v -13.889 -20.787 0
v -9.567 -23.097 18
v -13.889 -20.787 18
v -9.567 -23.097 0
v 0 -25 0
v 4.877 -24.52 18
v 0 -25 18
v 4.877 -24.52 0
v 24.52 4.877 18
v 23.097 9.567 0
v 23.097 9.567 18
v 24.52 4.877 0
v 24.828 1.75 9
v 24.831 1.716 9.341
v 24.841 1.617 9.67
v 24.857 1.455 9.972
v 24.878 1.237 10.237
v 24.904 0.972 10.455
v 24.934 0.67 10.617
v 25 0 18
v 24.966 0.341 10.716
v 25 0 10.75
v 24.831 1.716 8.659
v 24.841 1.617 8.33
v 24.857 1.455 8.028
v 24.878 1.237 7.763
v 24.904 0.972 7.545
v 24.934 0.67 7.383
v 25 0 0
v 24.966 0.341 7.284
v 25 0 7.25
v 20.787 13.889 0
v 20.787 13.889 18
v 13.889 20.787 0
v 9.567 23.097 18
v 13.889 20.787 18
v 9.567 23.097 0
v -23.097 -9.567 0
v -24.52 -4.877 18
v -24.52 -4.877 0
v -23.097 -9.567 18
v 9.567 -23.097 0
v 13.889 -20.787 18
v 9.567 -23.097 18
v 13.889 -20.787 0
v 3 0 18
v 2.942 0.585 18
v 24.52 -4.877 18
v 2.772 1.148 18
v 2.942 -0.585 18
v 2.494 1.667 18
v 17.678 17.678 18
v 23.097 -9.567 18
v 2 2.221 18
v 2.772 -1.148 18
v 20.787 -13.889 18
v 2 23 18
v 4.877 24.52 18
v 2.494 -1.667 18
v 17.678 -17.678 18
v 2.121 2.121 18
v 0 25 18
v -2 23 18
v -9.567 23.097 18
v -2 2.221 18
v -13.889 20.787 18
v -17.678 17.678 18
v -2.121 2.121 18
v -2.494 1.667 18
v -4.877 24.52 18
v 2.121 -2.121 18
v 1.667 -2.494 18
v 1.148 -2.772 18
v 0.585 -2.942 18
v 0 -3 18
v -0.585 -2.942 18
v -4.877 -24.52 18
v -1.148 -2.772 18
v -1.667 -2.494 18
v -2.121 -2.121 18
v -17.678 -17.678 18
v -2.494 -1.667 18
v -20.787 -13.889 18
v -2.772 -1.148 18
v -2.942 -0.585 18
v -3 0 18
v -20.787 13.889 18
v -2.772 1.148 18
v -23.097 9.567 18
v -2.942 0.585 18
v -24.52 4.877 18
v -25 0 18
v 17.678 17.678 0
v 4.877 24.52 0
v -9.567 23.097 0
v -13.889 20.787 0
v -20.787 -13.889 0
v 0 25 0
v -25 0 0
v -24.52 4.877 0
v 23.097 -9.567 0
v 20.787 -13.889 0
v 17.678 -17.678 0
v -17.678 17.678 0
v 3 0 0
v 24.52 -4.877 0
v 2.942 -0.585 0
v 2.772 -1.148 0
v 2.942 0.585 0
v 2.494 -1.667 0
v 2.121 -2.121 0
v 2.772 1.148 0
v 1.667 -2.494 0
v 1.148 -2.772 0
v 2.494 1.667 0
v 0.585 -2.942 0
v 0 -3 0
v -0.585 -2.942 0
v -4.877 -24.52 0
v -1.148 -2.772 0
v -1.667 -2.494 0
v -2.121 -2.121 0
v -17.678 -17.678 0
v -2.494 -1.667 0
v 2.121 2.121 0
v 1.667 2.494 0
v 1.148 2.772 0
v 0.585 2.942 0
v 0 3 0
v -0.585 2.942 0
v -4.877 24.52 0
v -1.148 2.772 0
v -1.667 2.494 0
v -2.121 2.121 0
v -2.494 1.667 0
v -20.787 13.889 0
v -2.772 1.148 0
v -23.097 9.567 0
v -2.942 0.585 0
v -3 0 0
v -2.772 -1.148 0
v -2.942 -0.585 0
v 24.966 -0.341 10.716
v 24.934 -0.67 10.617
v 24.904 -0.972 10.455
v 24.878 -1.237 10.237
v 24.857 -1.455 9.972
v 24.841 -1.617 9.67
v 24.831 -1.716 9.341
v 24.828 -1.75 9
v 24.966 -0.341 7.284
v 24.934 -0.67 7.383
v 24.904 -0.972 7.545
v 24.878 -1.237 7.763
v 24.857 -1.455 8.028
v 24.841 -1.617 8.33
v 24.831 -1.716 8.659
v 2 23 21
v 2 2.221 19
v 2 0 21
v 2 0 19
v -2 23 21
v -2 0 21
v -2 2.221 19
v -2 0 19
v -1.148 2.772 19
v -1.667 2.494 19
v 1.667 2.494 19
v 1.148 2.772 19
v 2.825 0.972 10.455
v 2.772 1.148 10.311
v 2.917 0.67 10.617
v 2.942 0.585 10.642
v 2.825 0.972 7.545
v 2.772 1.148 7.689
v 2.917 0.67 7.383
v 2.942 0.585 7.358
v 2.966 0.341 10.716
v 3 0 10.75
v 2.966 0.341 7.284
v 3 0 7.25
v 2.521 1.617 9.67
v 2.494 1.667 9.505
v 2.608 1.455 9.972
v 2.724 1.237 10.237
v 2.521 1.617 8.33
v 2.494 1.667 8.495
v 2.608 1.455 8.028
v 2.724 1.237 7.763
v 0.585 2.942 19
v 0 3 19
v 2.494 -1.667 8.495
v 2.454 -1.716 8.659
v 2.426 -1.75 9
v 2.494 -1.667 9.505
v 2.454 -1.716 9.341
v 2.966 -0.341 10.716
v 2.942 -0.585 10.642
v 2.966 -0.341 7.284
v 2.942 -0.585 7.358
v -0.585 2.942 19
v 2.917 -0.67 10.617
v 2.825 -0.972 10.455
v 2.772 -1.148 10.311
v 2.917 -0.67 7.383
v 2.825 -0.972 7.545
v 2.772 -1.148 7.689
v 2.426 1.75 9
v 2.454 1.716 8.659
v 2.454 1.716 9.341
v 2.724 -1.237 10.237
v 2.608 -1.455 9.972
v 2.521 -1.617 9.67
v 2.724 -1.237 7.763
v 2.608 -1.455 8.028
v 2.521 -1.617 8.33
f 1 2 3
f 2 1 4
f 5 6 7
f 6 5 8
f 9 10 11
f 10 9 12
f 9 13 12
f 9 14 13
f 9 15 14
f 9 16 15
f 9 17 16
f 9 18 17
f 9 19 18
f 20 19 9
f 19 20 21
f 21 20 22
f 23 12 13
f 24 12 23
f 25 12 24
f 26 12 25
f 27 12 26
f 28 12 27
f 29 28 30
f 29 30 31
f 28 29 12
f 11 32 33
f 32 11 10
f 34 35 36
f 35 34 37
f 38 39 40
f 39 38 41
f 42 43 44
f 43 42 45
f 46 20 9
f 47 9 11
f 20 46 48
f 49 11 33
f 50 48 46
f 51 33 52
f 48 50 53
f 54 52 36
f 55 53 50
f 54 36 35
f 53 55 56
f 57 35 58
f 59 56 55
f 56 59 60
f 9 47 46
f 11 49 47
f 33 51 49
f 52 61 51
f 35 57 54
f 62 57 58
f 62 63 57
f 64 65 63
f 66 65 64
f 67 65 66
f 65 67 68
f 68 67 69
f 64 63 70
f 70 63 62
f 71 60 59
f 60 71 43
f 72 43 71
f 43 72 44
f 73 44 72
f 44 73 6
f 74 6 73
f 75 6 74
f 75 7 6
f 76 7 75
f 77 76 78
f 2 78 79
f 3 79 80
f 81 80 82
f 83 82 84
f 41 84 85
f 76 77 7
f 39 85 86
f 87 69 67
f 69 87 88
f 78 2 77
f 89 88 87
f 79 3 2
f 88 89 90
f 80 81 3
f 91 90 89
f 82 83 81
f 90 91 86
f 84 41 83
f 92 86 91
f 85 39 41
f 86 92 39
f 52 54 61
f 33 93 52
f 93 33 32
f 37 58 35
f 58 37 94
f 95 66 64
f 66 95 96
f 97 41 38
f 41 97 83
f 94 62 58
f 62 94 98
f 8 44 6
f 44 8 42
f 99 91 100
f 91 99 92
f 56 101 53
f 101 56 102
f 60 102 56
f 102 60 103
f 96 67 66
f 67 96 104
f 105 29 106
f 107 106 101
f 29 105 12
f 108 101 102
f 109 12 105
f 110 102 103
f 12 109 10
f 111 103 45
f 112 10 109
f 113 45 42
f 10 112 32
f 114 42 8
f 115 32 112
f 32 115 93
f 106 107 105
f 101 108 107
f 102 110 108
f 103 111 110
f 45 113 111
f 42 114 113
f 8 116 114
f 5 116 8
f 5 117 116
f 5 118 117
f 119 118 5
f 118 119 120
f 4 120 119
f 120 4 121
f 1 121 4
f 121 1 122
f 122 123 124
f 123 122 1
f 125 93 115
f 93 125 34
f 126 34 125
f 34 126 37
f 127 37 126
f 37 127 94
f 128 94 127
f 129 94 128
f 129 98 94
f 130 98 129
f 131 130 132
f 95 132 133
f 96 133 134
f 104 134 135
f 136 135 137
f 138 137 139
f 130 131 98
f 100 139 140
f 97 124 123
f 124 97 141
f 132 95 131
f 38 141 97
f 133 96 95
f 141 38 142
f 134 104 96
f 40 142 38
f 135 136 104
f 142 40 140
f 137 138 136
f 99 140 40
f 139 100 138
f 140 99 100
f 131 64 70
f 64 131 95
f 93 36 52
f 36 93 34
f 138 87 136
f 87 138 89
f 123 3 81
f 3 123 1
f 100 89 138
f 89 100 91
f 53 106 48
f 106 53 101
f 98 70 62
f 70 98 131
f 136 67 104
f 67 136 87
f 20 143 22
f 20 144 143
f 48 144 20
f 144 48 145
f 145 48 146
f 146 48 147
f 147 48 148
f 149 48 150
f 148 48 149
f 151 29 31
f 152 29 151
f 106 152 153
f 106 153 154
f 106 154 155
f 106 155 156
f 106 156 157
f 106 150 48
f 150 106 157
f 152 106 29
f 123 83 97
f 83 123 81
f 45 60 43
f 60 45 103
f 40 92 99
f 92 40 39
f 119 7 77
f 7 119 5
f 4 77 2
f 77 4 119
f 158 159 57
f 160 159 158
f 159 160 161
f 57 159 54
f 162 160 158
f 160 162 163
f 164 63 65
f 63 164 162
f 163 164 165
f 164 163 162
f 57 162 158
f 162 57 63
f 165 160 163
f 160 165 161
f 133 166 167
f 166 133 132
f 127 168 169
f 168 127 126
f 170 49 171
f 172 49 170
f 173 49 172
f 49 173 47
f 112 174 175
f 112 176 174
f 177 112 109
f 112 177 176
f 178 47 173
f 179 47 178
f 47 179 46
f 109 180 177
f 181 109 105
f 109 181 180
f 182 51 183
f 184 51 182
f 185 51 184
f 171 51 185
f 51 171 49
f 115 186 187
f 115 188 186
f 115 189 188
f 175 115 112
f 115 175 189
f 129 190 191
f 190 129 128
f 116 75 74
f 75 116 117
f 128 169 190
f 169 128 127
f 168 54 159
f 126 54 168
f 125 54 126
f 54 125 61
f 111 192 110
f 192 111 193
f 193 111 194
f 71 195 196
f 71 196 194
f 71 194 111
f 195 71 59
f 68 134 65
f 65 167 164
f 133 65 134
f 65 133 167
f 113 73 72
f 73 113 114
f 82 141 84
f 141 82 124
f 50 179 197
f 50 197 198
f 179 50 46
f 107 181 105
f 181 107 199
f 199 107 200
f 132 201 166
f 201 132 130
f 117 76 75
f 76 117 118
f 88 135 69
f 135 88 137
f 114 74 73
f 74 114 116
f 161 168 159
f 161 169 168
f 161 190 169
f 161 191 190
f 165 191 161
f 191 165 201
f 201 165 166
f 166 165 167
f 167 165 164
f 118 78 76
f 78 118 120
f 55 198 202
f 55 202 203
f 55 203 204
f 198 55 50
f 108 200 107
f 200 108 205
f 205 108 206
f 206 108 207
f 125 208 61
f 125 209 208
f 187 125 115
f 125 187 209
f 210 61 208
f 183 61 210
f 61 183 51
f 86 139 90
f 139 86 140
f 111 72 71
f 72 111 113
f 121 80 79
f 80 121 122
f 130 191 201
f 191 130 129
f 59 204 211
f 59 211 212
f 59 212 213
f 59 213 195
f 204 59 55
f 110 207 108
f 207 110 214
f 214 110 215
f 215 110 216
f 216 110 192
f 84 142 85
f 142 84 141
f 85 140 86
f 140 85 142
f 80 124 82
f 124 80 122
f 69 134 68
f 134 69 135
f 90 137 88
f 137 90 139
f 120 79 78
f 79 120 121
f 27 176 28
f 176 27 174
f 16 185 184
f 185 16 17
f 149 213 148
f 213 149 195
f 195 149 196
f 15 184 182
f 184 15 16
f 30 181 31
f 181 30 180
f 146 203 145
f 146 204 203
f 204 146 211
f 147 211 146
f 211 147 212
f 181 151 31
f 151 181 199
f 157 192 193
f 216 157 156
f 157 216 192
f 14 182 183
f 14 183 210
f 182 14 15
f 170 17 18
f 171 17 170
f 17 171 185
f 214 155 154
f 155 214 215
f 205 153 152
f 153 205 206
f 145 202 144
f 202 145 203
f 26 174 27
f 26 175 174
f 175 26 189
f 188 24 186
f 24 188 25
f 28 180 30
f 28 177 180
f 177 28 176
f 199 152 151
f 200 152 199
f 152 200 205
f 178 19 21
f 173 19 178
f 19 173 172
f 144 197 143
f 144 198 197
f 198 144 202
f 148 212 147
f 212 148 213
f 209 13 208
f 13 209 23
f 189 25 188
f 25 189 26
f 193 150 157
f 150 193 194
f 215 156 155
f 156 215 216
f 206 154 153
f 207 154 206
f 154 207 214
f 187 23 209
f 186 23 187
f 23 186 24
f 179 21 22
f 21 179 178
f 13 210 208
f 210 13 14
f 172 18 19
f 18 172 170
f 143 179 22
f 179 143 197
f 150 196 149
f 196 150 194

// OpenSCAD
$fn = 32;

// ----------------------------------------------------------------------
// Control knob: pointer knob
// ----------------------------------------------------------------------

// --- parameters (mm) ---
rib_w = 4;                // pointer rib width
rib_h = 4;                // pointer rib height
knob_d = 50;              // knob body diameter
knob_h = 18;              // knob body height
bore_d = 6;               // shaft bore diameter
set_d = 3.5;              // set screw bore diameter
fit_tol = 0.05;           // tolerance for press fits, mm
free_tol = 0.2;           // tolerance for clearance fits, mm

rib_poke = rib_h - 1;  // rib height above the top
total_h = knob_h + rib_h - 1;  // overall height

difference() {
  union() {
    cylinder(h = knob_h, d = knob_d);
    translate([-rib_w / 2, 0, knob_h - 1])
      cube([rib_w, knob_d / 2 - 2, rib_h]);
  }
  translate([0, 0, -1]) cylinder(h = knob_h + 2, d = bore_d);
  translate([-1, 0, knob_h / 2]) rotate([0, 90, 0])
    cylinder(h = knob_d / 2 + bore_d / 2 + 2, d = set_d);}
